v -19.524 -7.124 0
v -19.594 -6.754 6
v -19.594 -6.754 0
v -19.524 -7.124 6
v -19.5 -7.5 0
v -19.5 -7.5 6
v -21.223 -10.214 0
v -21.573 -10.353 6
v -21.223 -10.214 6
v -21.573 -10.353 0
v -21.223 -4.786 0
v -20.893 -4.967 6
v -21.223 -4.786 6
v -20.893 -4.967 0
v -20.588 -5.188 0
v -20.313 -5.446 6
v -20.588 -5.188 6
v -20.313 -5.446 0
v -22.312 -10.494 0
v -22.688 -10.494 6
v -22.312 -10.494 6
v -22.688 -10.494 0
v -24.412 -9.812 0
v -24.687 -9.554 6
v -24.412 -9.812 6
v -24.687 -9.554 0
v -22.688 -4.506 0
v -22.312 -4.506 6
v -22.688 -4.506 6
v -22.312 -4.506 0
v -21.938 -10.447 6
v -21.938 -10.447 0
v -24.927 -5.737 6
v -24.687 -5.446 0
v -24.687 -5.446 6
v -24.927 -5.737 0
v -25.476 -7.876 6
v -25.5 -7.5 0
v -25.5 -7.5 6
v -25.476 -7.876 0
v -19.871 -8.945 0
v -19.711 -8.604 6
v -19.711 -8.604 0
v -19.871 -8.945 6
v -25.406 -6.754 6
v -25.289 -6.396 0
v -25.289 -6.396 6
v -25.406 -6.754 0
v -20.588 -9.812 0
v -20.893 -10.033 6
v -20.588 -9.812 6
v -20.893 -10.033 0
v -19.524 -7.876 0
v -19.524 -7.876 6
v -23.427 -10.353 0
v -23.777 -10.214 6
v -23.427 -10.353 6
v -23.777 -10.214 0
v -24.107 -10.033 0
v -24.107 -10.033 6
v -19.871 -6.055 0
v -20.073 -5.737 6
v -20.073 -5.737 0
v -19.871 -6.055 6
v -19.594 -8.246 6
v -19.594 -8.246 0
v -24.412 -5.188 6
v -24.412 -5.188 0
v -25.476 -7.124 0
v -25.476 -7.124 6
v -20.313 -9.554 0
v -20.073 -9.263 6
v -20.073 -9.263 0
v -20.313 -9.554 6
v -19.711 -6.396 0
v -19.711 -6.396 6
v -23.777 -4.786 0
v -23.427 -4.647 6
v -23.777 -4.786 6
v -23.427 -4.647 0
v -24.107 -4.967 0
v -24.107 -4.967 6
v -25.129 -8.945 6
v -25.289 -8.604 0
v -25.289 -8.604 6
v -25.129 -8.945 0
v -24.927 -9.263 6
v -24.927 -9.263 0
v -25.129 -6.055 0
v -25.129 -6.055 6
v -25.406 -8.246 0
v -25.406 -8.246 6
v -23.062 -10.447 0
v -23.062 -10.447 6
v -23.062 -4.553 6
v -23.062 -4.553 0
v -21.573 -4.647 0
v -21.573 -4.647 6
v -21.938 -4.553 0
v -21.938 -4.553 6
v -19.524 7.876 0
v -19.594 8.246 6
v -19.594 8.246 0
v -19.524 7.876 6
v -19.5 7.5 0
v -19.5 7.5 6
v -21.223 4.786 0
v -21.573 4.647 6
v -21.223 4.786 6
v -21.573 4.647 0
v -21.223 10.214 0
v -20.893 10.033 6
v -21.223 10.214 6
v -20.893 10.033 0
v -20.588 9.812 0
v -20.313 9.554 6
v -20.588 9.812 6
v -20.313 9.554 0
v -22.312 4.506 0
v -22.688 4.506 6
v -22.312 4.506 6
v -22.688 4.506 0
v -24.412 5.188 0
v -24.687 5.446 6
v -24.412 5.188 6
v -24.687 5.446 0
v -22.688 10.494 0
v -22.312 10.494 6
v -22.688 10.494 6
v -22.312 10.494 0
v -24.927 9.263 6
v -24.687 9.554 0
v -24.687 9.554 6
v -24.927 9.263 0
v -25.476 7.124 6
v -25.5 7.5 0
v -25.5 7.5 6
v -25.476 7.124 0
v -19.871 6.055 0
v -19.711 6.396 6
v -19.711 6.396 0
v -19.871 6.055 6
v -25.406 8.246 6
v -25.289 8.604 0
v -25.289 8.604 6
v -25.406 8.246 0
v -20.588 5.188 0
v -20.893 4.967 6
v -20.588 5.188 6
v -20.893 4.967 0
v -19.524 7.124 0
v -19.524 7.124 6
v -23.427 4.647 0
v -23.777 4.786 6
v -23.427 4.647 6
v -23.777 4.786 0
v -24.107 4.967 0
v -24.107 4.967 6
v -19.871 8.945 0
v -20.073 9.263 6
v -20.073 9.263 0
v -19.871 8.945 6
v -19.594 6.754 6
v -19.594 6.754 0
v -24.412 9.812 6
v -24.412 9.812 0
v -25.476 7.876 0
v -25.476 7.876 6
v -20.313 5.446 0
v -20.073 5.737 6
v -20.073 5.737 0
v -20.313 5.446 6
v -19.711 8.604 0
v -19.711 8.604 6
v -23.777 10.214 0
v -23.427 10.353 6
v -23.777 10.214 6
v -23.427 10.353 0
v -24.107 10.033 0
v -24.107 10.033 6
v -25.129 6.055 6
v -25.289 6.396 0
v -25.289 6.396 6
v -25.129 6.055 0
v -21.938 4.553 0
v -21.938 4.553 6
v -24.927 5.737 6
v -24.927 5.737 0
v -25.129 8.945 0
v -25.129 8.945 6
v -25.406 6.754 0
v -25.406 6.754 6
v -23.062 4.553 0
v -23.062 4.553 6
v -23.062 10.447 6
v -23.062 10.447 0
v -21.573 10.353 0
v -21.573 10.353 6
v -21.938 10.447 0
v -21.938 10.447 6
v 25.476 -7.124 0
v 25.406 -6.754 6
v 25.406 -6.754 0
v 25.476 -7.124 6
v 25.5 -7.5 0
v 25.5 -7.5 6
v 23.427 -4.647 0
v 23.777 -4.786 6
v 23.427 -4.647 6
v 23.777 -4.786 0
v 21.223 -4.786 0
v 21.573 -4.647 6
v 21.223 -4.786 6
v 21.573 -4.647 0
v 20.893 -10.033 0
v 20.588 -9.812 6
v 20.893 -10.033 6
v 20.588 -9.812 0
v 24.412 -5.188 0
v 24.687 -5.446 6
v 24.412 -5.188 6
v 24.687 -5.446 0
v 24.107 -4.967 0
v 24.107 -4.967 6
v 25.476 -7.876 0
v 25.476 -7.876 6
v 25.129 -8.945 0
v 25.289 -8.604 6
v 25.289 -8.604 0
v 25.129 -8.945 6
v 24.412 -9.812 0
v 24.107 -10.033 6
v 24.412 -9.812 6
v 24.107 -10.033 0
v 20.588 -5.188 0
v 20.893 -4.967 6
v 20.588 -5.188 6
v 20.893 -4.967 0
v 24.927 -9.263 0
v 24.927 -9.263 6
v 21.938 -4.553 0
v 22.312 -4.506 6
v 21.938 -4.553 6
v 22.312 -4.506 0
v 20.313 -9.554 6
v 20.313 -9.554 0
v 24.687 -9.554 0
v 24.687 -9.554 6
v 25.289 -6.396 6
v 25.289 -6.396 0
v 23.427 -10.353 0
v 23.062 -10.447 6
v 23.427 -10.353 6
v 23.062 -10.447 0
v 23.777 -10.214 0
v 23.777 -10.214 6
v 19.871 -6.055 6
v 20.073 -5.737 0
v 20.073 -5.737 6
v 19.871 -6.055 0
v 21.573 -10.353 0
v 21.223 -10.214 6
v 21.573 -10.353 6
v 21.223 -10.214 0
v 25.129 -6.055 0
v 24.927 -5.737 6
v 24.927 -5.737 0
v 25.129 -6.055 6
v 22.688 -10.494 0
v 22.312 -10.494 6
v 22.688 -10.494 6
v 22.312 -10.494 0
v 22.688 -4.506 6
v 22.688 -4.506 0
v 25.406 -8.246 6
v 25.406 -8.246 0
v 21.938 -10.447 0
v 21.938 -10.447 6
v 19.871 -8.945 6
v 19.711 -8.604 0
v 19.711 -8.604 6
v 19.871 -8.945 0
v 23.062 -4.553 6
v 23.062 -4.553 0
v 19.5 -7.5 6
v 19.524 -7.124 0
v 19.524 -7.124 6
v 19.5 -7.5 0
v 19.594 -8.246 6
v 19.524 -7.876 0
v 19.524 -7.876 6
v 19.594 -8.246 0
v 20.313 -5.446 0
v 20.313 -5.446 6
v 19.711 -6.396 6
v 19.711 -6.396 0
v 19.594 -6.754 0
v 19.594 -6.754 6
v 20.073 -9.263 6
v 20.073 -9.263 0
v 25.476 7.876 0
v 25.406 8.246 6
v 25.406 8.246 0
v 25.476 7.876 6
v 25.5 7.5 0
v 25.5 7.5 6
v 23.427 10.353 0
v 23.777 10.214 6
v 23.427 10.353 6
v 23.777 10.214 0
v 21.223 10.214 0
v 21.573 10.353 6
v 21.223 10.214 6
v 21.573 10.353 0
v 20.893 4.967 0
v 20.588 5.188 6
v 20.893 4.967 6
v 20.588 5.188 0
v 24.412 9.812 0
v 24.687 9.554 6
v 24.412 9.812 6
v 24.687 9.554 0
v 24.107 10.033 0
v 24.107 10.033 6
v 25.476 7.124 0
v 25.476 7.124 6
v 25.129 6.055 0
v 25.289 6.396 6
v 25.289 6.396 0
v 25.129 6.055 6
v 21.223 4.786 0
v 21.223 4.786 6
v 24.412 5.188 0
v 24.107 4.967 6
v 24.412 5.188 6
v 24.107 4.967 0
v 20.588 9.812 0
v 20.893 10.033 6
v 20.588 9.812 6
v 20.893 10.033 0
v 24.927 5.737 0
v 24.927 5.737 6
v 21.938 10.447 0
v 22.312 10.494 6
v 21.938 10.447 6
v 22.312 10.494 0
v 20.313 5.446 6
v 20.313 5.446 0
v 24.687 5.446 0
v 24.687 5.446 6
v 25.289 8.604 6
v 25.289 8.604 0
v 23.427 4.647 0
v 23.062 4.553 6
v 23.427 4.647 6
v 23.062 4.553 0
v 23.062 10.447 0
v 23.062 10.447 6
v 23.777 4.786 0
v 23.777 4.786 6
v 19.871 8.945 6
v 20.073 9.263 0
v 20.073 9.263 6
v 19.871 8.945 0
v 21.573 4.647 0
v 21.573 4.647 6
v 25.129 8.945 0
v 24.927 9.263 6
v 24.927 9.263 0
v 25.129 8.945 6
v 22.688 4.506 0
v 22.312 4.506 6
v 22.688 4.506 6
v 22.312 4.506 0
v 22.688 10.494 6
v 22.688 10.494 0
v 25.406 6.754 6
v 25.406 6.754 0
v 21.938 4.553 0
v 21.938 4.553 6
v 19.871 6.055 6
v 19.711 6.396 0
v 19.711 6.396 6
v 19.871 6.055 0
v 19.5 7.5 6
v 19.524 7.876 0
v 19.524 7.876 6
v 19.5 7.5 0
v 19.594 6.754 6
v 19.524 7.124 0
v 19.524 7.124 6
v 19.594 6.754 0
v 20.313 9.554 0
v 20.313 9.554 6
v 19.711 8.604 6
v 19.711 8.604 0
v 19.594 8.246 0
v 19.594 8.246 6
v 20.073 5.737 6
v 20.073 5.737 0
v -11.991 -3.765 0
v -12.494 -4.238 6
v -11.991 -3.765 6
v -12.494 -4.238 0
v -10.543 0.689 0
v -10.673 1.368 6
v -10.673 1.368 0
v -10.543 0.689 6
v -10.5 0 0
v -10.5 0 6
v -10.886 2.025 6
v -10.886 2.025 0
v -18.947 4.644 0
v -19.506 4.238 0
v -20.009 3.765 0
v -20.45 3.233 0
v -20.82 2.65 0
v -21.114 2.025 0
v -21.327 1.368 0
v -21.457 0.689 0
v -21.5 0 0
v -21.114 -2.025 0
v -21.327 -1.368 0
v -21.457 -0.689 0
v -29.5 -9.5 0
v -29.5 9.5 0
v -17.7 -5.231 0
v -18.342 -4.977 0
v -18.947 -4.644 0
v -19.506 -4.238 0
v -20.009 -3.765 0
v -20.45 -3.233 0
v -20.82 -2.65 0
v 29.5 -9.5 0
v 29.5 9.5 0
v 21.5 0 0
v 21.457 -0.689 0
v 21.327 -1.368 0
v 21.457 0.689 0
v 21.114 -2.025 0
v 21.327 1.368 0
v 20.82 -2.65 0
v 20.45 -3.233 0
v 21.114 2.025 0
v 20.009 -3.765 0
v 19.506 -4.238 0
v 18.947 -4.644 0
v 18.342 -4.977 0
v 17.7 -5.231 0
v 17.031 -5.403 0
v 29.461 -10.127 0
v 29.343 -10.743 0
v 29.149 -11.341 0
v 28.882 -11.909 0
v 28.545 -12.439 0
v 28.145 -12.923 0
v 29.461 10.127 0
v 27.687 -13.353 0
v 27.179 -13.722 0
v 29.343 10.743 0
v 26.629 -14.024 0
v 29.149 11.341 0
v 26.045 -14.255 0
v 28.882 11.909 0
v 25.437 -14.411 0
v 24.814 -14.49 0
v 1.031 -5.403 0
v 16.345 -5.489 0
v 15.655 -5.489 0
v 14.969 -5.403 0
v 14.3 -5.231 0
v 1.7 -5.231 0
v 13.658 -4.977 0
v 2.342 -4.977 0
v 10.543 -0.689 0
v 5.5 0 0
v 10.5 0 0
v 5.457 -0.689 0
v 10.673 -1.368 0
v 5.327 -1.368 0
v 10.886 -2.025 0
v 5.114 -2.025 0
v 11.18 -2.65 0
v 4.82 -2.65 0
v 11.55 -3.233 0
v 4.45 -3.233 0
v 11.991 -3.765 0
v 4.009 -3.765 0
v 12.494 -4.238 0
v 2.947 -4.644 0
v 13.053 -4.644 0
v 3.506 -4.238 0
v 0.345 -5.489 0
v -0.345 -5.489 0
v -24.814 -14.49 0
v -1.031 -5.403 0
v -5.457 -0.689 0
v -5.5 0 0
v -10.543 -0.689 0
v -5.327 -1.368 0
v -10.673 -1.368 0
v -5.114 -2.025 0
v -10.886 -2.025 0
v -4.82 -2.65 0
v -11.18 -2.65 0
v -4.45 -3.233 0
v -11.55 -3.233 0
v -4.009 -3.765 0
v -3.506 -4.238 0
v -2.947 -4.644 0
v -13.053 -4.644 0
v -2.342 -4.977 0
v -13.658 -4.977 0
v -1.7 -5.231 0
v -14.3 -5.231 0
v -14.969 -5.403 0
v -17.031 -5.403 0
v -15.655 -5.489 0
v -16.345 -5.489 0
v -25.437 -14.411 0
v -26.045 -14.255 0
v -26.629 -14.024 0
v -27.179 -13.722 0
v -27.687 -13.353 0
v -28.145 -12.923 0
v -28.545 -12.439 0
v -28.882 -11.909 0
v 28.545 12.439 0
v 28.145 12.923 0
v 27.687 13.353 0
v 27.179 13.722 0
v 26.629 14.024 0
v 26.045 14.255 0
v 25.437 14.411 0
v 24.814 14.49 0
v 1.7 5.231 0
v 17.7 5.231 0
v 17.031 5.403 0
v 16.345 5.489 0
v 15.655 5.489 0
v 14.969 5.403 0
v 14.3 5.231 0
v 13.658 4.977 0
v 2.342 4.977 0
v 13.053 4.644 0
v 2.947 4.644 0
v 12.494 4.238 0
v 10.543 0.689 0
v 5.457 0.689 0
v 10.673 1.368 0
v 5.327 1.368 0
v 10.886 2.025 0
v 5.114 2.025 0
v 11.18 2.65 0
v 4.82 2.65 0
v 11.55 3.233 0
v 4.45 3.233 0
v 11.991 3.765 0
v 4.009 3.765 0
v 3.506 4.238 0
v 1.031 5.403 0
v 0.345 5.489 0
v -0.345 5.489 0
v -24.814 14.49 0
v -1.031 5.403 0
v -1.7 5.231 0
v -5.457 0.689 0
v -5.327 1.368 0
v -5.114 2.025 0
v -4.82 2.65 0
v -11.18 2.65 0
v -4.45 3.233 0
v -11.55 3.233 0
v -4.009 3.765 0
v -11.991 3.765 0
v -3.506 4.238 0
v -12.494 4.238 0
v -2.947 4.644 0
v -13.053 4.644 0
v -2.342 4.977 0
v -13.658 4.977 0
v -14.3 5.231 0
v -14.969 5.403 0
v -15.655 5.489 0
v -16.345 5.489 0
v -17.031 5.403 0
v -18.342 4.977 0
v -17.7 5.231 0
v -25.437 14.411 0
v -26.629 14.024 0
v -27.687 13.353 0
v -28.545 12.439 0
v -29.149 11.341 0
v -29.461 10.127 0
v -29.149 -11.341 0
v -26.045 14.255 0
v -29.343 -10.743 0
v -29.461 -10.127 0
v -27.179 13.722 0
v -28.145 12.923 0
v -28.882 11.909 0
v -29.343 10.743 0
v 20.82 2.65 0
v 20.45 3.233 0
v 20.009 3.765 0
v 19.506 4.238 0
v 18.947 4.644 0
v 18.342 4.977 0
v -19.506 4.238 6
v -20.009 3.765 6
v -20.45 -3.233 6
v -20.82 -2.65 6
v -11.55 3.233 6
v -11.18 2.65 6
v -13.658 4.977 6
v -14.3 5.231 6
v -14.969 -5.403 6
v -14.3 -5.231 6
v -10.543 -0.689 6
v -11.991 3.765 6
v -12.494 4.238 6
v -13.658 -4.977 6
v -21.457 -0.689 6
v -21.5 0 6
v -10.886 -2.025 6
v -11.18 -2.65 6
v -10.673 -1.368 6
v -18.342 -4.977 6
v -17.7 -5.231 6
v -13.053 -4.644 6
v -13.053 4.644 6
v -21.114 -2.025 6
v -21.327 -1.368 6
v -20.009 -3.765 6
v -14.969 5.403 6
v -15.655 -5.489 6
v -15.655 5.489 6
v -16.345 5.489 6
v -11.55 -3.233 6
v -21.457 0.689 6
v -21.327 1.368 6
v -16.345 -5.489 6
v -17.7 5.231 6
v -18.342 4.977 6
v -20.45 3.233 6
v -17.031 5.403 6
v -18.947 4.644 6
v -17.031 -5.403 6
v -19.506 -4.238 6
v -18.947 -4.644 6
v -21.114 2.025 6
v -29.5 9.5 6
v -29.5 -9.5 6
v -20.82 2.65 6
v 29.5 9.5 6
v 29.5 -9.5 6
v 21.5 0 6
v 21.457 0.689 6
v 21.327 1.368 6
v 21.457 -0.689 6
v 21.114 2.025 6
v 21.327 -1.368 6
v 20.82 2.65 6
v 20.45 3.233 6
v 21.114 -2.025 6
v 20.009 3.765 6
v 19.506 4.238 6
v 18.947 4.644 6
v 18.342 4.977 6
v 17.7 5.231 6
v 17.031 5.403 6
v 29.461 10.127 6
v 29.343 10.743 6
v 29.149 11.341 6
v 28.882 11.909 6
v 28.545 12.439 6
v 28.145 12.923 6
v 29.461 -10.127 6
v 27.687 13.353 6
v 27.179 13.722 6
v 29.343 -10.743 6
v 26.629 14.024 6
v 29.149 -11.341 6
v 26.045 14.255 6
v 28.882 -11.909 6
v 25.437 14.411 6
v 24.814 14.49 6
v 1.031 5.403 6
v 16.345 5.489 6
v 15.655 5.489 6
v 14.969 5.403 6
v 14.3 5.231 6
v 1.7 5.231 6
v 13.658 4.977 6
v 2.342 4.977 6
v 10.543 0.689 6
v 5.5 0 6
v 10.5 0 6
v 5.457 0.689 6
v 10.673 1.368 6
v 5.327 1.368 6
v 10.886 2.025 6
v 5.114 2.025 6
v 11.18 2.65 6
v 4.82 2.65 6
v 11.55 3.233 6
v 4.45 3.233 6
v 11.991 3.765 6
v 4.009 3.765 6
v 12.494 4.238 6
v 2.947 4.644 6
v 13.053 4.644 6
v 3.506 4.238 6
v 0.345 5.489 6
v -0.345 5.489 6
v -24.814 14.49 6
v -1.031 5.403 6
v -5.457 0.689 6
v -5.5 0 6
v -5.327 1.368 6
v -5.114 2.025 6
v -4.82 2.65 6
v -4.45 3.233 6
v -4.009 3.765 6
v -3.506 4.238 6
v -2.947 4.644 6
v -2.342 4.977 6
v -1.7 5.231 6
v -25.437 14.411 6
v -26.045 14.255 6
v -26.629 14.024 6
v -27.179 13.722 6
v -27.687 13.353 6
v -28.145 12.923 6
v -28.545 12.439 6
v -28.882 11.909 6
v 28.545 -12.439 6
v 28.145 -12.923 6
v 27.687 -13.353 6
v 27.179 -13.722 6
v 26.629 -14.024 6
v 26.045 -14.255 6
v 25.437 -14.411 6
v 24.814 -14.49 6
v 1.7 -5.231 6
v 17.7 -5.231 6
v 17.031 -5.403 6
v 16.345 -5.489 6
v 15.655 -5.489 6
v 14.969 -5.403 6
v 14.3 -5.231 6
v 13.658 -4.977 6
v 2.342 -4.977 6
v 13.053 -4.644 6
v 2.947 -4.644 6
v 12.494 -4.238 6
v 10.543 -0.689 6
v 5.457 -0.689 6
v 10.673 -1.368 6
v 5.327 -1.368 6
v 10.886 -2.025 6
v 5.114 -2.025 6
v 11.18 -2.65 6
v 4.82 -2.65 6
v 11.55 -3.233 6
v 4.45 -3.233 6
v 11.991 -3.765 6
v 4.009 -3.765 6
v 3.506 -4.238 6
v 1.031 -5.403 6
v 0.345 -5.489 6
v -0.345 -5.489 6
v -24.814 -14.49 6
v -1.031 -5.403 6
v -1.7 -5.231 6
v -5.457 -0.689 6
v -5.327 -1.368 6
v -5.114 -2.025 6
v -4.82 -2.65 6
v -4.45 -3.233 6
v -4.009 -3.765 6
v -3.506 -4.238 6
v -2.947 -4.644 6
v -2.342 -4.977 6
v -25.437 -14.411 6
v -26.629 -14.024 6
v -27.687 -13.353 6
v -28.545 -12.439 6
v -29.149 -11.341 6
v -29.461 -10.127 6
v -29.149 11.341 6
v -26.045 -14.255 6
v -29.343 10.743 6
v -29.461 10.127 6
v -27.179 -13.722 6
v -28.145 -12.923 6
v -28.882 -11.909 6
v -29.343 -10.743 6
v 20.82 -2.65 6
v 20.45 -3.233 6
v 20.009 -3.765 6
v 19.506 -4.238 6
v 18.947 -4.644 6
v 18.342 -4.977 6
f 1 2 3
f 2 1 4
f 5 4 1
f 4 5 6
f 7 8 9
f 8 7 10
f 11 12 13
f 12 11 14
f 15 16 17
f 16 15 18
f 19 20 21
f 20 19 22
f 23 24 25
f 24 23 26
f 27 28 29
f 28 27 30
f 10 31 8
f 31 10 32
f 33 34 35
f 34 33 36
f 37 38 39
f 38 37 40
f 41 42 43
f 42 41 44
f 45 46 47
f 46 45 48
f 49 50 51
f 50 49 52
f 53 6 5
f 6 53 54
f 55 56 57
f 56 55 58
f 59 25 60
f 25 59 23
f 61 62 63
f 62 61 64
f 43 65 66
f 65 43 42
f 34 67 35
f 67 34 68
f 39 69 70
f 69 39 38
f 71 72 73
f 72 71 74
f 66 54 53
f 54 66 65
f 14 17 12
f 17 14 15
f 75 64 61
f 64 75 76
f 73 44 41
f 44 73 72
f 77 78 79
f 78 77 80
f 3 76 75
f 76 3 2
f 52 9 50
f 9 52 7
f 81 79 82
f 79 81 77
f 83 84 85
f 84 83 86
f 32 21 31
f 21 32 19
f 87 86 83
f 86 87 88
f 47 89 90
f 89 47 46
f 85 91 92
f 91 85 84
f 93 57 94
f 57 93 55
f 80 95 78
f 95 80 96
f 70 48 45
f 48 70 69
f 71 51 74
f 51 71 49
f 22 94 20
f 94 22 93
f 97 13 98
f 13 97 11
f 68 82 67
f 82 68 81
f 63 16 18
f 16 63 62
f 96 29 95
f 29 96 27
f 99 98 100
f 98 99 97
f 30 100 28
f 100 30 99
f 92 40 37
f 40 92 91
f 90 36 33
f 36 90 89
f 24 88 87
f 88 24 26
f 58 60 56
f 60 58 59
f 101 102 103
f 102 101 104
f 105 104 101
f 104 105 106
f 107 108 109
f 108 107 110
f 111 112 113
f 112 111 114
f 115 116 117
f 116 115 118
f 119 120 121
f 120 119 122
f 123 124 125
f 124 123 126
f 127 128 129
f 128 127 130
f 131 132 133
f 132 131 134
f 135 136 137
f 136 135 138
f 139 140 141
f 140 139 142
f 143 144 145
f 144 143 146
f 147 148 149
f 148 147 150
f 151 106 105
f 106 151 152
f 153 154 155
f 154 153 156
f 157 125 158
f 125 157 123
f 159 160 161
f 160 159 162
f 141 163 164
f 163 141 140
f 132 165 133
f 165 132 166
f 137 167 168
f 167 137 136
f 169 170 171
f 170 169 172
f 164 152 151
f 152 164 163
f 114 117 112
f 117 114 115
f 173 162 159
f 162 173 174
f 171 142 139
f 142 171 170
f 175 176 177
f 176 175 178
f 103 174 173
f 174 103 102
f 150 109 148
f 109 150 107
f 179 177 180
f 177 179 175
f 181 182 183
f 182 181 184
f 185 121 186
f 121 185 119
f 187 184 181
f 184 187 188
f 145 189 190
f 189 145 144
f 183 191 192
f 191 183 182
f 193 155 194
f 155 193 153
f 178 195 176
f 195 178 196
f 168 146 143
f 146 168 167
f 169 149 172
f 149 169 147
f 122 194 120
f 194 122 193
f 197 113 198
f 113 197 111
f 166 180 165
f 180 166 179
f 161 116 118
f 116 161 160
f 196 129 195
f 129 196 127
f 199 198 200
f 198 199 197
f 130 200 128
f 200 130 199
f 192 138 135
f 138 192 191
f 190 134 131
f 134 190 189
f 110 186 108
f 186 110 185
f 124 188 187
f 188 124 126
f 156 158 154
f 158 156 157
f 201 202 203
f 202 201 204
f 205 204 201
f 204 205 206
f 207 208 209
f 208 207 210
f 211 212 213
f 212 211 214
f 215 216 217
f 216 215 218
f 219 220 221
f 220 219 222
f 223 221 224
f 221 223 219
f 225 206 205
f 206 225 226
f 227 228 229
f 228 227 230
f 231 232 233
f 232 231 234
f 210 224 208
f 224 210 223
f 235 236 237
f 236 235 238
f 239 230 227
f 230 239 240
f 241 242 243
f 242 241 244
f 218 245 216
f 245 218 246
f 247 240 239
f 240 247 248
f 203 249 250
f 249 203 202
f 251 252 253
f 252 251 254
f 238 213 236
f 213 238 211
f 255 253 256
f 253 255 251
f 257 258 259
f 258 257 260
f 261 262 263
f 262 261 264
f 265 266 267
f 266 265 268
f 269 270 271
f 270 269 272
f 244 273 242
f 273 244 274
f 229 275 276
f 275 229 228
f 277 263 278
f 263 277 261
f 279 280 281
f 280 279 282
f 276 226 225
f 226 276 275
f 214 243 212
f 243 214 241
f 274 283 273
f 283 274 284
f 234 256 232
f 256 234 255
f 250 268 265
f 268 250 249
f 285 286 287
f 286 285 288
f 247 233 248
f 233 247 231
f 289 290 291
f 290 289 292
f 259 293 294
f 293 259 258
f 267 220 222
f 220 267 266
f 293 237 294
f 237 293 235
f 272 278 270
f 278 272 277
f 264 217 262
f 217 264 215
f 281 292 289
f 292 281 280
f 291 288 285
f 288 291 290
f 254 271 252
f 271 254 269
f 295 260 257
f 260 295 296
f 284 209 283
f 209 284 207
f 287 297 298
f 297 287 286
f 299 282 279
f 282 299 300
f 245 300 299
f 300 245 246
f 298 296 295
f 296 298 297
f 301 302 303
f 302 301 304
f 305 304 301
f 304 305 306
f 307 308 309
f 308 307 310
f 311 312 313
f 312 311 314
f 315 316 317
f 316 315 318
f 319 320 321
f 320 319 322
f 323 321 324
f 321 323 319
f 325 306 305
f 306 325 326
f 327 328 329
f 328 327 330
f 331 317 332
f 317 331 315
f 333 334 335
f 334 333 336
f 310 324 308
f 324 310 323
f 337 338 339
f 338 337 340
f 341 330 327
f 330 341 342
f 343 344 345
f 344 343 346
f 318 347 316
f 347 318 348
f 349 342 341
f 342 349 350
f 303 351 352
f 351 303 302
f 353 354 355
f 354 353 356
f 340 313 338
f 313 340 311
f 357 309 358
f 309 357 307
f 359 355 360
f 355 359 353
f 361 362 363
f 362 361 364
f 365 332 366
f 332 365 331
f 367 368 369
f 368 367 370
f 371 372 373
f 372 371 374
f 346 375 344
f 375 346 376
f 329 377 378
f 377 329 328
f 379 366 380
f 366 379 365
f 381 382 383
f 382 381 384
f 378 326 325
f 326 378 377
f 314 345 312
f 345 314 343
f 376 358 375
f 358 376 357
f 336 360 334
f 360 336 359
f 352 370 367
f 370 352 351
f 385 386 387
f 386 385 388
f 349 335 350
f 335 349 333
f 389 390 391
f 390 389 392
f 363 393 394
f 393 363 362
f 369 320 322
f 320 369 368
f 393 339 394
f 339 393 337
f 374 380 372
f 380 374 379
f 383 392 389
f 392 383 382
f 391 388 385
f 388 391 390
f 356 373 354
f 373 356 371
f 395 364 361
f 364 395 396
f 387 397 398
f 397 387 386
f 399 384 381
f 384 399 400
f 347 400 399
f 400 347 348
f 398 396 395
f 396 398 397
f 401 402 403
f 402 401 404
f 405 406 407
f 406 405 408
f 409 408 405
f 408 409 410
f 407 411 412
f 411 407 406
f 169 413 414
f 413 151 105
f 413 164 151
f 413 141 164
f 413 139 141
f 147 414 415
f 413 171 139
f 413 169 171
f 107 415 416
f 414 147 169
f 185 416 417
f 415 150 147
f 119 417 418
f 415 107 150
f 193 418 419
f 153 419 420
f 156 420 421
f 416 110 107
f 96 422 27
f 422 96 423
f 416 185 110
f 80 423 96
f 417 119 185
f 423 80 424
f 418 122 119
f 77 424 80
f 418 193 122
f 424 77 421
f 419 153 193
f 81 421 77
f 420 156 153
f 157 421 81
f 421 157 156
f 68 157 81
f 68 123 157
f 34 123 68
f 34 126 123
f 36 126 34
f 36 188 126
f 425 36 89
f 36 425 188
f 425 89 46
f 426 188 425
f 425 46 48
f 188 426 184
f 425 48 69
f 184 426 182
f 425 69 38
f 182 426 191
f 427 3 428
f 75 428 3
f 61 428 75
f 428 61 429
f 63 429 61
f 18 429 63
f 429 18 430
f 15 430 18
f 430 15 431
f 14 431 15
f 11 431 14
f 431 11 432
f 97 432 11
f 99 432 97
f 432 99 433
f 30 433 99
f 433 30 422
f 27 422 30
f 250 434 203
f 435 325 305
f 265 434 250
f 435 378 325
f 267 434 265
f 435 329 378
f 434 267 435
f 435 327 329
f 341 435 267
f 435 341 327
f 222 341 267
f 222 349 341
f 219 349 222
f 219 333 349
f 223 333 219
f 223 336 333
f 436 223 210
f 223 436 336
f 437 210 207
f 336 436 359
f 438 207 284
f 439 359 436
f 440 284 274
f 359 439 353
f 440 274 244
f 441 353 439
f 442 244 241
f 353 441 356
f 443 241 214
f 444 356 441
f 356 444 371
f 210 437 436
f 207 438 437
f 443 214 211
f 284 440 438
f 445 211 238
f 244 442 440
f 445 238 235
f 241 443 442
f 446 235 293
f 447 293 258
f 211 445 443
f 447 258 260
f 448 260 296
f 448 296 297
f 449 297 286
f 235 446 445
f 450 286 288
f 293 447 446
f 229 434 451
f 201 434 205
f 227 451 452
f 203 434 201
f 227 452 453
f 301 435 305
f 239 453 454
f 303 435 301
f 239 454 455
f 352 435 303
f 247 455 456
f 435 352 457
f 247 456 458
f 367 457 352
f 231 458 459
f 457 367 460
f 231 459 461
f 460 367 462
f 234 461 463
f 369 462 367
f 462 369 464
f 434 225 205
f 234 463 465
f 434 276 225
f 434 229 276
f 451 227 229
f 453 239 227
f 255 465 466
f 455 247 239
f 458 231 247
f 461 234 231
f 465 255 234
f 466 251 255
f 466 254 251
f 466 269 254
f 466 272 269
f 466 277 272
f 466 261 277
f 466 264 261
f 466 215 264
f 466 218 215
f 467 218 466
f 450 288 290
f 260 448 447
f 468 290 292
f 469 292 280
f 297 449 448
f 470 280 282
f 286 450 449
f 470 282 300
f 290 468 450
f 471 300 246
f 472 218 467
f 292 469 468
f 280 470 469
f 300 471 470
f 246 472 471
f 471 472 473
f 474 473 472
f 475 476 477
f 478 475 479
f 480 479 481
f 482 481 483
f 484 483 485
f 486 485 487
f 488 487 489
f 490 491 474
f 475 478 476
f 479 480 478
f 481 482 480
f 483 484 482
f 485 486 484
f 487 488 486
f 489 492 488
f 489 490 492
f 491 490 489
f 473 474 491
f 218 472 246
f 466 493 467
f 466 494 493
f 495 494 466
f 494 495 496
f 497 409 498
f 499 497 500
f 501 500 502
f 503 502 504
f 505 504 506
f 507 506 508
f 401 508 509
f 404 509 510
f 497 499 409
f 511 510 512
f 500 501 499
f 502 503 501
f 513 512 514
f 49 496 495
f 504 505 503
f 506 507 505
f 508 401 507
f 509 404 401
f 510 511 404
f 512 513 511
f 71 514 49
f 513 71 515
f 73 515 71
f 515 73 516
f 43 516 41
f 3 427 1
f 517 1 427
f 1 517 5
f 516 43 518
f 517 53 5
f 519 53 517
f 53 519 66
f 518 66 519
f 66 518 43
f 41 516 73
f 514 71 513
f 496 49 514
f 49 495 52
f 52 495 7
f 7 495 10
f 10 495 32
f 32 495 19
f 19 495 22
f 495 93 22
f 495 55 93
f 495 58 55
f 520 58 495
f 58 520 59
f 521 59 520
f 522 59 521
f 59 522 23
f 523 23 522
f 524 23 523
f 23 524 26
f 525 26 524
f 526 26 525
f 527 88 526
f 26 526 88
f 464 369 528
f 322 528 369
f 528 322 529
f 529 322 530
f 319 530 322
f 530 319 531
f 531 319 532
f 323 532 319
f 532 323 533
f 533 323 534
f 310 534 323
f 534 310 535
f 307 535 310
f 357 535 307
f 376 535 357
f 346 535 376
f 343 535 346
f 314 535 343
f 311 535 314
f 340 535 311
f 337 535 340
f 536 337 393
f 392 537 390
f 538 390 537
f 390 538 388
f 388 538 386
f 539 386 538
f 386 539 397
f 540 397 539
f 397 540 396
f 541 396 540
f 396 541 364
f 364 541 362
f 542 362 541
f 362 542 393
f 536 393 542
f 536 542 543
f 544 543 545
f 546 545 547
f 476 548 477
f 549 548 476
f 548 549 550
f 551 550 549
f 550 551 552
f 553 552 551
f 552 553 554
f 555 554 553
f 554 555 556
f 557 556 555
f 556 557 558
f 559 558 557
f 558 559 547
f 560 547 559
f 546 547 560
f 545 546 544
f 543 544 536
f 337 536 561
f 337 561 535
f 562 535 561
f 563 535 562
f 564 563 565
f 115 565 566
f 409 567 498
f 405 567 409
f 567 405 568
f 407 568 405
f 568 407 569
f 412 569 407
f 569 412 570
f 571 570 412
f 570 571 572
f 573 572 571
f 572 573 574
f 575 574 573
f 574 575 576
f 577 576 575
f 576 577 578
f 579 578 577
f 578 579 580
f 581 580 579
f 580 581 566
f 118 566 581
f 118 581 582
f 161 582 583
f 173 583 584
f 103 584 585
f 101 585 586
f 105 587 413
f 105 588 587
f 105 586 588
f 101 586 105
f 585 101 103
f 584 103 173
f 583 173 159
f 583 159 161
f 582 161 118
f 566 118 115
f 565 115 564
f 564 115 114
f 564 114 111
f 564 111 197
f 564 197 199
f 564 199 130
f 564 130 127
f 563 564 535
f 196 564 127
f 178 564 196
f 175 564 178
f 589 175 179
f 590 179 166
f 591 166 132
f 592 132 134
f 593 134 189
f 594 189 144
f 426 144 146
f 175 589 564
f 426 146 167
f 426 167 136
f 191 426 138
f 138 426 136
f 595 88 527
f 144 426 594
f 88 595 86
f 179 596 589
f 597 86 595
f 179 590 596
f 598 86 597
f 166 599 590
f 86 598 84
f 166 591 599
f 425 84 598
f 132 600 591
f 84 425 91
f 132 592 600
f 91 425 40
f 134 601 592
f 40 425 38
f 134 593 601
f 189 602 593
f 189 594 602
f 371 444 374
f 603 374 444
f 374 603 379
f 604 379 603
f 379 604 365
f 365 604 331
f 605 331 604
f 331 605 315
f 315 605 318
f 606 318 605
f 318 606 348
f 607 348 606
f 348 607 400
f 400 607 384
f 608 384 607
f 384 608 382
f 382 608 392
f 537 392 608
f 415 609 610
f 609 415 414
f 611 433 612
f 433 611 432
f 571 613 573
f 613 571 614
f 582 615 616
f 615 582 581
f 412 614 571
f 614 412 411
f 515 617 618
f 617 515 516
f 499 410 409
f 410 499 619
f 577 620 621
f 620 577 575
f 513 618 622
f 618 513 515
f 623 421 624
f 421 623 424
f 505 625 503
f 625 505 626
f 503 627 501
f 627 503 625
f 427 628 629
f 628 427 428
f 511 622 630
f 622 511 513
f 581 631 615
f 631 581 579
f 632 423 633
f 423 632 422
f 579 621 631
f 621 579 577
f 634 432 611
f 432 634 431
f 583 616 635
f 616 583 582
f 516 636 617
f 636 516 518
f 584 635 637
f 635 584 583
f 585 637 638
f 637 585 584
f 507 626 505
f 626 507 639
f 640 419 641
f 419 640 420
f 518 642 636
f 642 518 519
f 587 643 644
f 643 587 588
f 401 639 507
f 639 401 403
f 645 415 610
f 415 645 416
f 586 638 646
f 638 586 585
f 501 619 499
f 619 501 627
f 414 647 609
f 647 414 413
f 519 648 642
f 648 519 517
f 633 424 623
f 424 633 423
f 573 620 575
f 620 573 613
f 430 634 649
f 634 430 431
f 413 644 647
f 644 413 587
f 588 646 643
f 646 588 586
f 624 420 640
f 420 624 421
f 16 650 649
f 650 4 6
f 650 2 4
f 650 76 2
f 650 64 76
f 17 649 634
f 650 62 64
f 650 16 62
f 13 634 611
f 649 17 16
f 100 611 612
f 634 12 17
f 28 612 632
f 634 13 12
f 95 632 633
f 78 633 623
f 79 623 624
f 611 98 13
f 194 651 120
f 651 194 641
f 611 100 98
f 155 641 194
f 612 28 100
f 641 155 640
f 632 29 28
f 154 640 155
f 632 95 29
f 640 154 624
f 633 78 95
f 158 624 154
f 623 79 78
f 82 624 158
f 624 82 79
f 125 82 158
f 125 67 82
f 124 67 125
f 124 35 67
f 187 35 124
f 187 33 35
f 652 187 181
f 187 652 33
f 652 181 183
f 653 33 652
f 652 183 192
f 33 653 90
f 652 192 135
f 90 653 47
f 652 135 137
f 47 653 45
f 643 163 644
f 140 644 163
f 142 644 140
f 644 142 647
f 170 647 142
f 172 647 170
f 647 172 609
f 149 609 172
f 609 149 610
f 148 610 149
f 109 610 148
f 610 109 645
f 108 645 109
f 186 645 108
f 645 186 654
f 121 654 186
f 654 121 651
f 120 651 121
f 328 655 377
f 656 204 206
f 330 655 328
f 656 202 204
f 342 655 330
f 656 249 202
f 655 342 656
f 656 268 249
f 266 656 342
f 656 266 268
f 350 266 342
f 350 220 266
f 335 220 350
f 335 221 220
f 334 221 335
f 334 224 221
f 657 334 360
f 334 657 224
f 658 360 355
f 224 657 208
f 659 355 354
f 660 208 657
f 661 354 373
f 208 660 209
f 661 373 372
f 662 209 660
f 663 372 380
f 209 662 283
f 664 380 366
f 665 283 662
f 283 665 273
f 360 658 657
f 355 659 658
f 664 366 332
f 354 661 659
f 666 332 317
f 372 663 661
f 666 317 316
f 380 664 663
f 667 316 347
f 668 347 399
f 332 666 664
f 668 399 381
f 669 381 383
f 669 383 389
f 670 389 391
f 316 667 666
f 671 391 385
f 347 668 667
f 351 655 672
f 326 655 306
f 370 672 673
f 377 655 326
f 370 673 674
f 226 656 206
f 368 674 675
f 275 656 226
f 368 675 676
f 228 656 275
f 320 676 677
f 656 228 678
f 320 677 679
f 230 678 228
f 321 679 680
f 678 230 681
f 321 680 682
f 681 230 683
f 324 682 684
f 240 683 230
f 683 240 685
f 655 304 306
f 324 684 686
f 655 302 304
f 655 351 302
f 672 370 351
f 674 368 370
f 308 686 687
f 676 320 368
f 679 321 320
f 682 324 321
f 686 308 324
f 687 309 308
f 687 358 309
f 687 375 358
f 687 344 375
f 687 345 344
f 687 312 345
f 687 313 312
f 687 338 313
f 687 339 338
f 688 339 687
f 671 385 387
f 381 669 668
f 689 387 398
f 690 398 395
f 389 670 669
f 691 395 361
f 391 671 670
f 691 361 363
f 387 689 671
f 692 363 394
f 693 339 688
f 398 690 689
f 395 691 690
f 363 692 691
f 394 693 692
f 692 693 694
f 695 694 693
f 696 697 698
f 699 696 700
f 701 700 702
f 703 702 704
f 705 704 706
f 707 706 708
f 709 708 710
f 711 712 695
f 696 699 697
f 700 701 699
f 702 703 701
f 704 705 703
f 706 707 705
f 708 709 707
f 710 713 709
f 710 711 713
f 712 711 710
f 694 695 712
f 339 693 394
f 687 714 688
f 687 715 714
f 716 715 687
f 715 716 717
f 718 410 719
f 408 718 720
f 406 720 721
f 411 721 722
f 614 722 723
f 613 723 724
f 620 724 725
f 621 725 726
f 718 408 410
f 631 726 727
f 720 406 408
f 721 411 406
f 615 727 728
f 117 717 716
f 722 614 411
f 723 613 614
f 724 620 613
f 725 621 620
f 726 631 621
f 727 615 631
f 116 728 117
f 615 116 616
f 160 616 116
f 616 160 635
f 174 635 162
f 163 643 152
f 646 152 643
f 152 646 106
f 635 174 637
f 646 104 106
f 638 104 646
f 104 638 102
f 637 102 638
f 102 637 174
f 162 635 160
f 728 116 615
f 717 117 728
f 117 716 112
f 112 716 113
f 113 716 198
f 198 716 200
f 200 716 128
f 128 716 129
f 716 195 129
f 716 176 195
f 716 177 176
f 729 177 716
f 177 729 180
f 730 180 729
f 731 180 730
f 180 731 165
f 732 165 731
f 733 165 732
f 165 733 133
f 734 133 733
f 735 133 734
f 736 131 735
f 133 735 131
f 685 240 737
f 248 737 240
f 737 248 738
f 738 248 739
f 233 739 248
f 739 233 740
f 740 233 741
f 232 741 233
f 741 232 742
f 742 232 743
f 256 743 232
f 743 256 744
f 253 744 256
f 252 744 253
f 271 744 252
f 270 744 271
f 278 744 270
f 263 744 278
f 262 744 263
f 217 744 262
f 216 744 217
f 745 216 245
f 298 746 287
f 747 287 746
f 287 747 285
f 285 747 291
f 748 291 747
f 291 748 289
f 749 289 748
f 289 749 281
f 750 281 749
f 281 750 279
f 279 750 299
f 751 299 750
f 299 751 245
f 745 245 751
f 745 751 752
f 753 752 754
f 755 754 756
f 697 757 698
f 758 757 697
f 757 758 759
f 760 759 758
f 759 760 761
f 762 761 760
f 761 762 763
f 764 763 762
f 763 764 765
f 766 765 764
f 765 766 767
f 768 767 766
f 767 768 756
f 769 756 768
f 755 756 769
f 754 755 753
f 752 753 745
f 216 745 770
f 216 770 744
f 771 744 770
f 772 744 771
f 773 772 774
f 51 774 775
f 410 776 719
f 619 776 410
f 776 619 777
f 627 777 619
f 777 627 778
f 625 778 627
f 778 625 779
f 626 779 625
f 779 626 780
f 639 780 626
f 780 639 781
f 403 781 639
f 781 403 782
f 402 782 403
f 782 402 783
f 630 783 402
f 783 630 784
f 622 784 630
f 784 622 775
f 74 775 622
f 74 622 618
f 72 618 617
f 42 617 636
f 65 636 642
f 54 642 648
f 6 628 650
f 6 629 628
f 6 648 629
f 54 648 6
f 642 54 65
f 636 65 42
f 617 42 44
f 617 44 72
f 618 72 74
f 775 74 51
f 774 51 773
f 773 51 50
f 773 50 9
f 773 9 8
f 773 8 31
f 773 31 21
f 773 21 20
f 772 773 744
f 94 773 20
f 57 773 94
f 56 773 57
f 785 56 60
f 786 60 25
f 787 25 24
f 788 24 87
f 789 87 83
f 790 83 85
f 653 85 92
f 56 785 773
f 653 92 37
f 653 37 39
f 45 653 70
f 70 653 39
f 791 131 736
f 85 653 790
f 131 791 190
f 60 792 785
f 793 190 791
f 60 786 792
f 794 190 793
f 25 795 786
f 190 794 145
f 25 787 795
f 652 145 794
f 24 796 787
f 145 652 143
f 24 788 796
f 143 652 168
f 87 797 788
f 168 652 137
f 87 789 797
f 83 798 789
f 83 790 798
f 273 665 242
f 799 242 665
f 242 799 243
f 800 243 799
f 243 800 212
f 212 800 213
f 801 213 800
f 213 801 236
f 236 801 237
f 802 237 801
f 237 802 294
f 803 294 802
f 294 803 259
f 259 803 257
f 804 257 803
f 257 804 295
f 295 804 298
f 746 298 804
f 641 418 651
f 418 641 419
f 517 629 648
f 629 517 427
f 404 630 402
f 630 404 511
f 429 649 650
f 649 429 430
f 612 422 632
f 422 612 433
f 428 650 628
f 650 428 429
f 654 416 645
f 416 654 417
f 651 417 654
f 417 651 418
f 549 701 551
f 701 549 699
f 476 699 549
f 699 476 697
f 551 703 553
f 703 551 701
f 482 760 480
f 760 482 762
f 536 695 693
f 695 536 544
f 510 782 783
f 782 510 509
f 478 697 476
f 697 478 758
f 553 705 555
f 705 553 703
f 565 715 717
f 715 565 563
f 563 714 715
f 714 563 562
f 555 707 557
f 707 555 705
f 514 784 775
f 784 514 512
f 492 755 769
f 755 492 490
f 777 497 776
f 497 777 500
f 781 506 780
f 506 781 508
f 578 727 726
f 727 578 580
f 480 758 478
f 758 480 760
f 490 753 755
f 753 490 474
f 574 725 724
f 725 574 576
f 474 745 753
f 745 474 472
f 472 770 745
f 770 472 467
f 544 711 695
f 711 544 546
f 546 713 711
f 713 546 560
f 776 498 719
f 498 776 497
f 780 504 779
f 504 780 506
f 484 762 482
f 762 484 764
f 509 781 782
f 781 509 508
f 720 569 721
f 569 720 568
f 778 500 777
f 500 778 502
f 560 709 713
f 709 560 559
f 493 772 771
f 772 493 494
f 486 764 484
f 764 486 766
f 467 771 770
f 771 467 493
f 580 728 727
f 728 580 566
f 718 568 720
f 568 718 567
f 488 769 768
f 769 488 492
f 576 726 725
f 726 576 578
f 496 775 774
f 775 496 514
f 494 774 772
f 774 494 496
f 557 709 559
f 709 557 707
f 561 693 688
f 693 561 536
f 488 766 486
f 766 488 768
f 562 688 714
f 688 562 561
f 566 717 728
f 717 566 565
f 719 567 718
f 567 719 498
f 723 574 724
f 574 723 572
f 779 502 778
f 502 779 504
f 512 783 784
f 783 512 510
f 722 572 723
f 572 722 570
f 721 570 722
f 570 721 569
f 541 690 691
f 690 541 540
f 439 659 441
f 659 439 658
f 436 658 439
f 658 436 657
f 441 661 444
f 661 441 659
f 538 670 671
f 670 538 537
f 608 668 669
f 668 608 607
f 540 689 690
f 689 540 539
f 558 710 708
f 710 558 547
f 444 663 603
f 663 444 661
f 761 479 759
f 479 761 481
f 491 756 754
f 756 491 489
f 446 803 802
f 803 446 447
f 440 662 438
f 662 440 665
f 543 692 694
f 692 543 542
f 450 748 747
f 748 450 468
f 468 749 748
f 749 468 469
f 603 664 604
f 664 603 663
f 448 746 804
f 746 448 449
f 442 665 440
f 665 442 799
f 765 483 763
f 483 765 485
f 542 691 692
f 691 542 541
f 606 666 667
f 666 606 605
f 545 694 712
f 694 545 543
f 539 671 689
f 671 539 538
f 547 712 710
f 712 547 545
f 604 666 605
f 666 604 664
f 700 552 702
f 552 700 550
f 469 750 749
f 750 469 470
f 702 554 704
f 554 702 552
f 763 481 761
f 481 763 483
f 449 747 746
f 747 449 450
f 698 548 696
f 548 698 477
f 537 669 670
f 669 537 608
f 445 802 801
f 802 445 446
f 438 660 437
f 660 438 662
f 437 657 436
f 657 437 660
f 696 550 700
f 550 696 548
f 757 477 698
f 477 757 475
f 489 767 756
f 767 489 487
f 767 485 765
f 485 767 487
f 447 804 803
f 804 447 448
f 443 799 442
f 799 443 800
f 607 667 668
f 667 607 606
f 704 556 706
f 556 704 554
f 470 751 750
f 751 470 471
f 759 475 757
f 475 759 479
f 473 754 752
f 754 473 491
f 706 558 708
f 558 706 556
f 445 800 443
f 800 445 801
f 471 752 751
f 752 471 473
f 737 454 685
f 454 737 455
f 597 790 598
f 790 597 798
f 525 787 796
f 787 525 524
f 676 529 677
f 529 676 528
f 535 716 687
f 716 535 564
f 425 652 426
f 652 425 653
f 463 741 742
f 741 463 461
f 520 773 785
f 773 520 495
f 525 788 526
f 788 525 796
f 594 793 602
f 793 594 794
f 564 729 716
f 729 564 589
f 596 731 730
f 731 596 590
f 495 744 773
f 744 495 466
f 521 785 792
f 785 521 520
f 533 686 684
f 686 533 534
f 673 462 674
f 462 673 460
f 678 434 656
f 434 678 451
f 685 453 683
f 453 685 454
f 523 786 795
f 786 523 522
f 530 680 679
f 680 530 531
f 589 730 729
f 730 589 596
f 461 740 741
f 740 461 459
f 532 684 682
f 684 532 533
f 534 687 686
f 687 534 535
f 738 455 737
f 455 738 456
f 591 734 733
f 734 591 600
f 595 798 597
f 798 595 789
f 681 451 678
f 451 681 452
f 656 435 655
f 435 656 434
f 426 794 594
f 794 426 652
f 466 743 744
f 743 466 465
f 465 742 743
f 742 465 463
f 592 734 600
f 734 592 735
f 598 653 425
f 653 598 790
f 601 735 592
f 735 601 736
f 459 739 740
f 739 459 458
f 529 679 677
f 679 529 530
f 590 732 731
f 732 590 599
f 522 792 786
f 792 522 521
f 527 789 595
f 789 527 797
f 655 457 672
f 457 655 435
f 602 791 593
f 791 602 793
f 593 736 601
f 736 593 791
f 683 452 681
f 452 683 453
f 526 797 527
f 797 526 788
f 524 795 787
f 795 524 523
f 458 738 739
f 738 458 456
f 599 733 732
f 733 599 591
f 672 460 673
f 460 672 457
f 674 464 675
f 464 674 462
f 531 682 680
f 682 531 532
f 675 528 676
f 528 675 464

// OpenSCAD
$fn = 50;


difference() {
	union() {
		hull() {
			translate(v = [-24.5000000000, 9.5000000000, 0]) {
				cylinder(h = 6, r = 5);
			}
			translate(v = [24.5000000000, 9.5000000000, 0]) {
				cylinder(h = 6, r = 5);
			}
			translate(v = [-24.5000000000, -9.5000000000, 0]) {
				cylinder(h = 6, r = 5);
			}
			translate(v = [24.5000000000, -9.5000000000, 0]) {
				cylinder(h = 6, r = 5);
			}
		}
	}
	union() {
		#translate(v = [-22.5000000000, -7.5000000000, -100.0000000000]) {
			cylinder(h = 200, r = 3.0000000000);
		}
		#translate(v = [-22.5000000000, 7.5000000000, -100.0000000000]) {
			cylinder(h = 200, r = 3.0000000000);
		}
		#translate(v = [22.5000000000, -7.5000000000, -100.0000000000]) {
			cylinder(h = 200, r = 3.0000000000);
		}
		#translate(v = [22.5000000000, 7.5000000000, -100.0000000000]) {
			cylinder(h = 200, r = 3.0000000000);
		}
		#translate(v = [-16.0000000000, 0, 0]) {
			cylinder(h = 6, r = 5.5000000000);
		}
		#cylinder(h = 6, r = 5.5000000000);
		#translate(v = [16.0000000000, 0, 0]) {
			cylinder(h = 6, r = 5.5000000000);
		}
	}
}
